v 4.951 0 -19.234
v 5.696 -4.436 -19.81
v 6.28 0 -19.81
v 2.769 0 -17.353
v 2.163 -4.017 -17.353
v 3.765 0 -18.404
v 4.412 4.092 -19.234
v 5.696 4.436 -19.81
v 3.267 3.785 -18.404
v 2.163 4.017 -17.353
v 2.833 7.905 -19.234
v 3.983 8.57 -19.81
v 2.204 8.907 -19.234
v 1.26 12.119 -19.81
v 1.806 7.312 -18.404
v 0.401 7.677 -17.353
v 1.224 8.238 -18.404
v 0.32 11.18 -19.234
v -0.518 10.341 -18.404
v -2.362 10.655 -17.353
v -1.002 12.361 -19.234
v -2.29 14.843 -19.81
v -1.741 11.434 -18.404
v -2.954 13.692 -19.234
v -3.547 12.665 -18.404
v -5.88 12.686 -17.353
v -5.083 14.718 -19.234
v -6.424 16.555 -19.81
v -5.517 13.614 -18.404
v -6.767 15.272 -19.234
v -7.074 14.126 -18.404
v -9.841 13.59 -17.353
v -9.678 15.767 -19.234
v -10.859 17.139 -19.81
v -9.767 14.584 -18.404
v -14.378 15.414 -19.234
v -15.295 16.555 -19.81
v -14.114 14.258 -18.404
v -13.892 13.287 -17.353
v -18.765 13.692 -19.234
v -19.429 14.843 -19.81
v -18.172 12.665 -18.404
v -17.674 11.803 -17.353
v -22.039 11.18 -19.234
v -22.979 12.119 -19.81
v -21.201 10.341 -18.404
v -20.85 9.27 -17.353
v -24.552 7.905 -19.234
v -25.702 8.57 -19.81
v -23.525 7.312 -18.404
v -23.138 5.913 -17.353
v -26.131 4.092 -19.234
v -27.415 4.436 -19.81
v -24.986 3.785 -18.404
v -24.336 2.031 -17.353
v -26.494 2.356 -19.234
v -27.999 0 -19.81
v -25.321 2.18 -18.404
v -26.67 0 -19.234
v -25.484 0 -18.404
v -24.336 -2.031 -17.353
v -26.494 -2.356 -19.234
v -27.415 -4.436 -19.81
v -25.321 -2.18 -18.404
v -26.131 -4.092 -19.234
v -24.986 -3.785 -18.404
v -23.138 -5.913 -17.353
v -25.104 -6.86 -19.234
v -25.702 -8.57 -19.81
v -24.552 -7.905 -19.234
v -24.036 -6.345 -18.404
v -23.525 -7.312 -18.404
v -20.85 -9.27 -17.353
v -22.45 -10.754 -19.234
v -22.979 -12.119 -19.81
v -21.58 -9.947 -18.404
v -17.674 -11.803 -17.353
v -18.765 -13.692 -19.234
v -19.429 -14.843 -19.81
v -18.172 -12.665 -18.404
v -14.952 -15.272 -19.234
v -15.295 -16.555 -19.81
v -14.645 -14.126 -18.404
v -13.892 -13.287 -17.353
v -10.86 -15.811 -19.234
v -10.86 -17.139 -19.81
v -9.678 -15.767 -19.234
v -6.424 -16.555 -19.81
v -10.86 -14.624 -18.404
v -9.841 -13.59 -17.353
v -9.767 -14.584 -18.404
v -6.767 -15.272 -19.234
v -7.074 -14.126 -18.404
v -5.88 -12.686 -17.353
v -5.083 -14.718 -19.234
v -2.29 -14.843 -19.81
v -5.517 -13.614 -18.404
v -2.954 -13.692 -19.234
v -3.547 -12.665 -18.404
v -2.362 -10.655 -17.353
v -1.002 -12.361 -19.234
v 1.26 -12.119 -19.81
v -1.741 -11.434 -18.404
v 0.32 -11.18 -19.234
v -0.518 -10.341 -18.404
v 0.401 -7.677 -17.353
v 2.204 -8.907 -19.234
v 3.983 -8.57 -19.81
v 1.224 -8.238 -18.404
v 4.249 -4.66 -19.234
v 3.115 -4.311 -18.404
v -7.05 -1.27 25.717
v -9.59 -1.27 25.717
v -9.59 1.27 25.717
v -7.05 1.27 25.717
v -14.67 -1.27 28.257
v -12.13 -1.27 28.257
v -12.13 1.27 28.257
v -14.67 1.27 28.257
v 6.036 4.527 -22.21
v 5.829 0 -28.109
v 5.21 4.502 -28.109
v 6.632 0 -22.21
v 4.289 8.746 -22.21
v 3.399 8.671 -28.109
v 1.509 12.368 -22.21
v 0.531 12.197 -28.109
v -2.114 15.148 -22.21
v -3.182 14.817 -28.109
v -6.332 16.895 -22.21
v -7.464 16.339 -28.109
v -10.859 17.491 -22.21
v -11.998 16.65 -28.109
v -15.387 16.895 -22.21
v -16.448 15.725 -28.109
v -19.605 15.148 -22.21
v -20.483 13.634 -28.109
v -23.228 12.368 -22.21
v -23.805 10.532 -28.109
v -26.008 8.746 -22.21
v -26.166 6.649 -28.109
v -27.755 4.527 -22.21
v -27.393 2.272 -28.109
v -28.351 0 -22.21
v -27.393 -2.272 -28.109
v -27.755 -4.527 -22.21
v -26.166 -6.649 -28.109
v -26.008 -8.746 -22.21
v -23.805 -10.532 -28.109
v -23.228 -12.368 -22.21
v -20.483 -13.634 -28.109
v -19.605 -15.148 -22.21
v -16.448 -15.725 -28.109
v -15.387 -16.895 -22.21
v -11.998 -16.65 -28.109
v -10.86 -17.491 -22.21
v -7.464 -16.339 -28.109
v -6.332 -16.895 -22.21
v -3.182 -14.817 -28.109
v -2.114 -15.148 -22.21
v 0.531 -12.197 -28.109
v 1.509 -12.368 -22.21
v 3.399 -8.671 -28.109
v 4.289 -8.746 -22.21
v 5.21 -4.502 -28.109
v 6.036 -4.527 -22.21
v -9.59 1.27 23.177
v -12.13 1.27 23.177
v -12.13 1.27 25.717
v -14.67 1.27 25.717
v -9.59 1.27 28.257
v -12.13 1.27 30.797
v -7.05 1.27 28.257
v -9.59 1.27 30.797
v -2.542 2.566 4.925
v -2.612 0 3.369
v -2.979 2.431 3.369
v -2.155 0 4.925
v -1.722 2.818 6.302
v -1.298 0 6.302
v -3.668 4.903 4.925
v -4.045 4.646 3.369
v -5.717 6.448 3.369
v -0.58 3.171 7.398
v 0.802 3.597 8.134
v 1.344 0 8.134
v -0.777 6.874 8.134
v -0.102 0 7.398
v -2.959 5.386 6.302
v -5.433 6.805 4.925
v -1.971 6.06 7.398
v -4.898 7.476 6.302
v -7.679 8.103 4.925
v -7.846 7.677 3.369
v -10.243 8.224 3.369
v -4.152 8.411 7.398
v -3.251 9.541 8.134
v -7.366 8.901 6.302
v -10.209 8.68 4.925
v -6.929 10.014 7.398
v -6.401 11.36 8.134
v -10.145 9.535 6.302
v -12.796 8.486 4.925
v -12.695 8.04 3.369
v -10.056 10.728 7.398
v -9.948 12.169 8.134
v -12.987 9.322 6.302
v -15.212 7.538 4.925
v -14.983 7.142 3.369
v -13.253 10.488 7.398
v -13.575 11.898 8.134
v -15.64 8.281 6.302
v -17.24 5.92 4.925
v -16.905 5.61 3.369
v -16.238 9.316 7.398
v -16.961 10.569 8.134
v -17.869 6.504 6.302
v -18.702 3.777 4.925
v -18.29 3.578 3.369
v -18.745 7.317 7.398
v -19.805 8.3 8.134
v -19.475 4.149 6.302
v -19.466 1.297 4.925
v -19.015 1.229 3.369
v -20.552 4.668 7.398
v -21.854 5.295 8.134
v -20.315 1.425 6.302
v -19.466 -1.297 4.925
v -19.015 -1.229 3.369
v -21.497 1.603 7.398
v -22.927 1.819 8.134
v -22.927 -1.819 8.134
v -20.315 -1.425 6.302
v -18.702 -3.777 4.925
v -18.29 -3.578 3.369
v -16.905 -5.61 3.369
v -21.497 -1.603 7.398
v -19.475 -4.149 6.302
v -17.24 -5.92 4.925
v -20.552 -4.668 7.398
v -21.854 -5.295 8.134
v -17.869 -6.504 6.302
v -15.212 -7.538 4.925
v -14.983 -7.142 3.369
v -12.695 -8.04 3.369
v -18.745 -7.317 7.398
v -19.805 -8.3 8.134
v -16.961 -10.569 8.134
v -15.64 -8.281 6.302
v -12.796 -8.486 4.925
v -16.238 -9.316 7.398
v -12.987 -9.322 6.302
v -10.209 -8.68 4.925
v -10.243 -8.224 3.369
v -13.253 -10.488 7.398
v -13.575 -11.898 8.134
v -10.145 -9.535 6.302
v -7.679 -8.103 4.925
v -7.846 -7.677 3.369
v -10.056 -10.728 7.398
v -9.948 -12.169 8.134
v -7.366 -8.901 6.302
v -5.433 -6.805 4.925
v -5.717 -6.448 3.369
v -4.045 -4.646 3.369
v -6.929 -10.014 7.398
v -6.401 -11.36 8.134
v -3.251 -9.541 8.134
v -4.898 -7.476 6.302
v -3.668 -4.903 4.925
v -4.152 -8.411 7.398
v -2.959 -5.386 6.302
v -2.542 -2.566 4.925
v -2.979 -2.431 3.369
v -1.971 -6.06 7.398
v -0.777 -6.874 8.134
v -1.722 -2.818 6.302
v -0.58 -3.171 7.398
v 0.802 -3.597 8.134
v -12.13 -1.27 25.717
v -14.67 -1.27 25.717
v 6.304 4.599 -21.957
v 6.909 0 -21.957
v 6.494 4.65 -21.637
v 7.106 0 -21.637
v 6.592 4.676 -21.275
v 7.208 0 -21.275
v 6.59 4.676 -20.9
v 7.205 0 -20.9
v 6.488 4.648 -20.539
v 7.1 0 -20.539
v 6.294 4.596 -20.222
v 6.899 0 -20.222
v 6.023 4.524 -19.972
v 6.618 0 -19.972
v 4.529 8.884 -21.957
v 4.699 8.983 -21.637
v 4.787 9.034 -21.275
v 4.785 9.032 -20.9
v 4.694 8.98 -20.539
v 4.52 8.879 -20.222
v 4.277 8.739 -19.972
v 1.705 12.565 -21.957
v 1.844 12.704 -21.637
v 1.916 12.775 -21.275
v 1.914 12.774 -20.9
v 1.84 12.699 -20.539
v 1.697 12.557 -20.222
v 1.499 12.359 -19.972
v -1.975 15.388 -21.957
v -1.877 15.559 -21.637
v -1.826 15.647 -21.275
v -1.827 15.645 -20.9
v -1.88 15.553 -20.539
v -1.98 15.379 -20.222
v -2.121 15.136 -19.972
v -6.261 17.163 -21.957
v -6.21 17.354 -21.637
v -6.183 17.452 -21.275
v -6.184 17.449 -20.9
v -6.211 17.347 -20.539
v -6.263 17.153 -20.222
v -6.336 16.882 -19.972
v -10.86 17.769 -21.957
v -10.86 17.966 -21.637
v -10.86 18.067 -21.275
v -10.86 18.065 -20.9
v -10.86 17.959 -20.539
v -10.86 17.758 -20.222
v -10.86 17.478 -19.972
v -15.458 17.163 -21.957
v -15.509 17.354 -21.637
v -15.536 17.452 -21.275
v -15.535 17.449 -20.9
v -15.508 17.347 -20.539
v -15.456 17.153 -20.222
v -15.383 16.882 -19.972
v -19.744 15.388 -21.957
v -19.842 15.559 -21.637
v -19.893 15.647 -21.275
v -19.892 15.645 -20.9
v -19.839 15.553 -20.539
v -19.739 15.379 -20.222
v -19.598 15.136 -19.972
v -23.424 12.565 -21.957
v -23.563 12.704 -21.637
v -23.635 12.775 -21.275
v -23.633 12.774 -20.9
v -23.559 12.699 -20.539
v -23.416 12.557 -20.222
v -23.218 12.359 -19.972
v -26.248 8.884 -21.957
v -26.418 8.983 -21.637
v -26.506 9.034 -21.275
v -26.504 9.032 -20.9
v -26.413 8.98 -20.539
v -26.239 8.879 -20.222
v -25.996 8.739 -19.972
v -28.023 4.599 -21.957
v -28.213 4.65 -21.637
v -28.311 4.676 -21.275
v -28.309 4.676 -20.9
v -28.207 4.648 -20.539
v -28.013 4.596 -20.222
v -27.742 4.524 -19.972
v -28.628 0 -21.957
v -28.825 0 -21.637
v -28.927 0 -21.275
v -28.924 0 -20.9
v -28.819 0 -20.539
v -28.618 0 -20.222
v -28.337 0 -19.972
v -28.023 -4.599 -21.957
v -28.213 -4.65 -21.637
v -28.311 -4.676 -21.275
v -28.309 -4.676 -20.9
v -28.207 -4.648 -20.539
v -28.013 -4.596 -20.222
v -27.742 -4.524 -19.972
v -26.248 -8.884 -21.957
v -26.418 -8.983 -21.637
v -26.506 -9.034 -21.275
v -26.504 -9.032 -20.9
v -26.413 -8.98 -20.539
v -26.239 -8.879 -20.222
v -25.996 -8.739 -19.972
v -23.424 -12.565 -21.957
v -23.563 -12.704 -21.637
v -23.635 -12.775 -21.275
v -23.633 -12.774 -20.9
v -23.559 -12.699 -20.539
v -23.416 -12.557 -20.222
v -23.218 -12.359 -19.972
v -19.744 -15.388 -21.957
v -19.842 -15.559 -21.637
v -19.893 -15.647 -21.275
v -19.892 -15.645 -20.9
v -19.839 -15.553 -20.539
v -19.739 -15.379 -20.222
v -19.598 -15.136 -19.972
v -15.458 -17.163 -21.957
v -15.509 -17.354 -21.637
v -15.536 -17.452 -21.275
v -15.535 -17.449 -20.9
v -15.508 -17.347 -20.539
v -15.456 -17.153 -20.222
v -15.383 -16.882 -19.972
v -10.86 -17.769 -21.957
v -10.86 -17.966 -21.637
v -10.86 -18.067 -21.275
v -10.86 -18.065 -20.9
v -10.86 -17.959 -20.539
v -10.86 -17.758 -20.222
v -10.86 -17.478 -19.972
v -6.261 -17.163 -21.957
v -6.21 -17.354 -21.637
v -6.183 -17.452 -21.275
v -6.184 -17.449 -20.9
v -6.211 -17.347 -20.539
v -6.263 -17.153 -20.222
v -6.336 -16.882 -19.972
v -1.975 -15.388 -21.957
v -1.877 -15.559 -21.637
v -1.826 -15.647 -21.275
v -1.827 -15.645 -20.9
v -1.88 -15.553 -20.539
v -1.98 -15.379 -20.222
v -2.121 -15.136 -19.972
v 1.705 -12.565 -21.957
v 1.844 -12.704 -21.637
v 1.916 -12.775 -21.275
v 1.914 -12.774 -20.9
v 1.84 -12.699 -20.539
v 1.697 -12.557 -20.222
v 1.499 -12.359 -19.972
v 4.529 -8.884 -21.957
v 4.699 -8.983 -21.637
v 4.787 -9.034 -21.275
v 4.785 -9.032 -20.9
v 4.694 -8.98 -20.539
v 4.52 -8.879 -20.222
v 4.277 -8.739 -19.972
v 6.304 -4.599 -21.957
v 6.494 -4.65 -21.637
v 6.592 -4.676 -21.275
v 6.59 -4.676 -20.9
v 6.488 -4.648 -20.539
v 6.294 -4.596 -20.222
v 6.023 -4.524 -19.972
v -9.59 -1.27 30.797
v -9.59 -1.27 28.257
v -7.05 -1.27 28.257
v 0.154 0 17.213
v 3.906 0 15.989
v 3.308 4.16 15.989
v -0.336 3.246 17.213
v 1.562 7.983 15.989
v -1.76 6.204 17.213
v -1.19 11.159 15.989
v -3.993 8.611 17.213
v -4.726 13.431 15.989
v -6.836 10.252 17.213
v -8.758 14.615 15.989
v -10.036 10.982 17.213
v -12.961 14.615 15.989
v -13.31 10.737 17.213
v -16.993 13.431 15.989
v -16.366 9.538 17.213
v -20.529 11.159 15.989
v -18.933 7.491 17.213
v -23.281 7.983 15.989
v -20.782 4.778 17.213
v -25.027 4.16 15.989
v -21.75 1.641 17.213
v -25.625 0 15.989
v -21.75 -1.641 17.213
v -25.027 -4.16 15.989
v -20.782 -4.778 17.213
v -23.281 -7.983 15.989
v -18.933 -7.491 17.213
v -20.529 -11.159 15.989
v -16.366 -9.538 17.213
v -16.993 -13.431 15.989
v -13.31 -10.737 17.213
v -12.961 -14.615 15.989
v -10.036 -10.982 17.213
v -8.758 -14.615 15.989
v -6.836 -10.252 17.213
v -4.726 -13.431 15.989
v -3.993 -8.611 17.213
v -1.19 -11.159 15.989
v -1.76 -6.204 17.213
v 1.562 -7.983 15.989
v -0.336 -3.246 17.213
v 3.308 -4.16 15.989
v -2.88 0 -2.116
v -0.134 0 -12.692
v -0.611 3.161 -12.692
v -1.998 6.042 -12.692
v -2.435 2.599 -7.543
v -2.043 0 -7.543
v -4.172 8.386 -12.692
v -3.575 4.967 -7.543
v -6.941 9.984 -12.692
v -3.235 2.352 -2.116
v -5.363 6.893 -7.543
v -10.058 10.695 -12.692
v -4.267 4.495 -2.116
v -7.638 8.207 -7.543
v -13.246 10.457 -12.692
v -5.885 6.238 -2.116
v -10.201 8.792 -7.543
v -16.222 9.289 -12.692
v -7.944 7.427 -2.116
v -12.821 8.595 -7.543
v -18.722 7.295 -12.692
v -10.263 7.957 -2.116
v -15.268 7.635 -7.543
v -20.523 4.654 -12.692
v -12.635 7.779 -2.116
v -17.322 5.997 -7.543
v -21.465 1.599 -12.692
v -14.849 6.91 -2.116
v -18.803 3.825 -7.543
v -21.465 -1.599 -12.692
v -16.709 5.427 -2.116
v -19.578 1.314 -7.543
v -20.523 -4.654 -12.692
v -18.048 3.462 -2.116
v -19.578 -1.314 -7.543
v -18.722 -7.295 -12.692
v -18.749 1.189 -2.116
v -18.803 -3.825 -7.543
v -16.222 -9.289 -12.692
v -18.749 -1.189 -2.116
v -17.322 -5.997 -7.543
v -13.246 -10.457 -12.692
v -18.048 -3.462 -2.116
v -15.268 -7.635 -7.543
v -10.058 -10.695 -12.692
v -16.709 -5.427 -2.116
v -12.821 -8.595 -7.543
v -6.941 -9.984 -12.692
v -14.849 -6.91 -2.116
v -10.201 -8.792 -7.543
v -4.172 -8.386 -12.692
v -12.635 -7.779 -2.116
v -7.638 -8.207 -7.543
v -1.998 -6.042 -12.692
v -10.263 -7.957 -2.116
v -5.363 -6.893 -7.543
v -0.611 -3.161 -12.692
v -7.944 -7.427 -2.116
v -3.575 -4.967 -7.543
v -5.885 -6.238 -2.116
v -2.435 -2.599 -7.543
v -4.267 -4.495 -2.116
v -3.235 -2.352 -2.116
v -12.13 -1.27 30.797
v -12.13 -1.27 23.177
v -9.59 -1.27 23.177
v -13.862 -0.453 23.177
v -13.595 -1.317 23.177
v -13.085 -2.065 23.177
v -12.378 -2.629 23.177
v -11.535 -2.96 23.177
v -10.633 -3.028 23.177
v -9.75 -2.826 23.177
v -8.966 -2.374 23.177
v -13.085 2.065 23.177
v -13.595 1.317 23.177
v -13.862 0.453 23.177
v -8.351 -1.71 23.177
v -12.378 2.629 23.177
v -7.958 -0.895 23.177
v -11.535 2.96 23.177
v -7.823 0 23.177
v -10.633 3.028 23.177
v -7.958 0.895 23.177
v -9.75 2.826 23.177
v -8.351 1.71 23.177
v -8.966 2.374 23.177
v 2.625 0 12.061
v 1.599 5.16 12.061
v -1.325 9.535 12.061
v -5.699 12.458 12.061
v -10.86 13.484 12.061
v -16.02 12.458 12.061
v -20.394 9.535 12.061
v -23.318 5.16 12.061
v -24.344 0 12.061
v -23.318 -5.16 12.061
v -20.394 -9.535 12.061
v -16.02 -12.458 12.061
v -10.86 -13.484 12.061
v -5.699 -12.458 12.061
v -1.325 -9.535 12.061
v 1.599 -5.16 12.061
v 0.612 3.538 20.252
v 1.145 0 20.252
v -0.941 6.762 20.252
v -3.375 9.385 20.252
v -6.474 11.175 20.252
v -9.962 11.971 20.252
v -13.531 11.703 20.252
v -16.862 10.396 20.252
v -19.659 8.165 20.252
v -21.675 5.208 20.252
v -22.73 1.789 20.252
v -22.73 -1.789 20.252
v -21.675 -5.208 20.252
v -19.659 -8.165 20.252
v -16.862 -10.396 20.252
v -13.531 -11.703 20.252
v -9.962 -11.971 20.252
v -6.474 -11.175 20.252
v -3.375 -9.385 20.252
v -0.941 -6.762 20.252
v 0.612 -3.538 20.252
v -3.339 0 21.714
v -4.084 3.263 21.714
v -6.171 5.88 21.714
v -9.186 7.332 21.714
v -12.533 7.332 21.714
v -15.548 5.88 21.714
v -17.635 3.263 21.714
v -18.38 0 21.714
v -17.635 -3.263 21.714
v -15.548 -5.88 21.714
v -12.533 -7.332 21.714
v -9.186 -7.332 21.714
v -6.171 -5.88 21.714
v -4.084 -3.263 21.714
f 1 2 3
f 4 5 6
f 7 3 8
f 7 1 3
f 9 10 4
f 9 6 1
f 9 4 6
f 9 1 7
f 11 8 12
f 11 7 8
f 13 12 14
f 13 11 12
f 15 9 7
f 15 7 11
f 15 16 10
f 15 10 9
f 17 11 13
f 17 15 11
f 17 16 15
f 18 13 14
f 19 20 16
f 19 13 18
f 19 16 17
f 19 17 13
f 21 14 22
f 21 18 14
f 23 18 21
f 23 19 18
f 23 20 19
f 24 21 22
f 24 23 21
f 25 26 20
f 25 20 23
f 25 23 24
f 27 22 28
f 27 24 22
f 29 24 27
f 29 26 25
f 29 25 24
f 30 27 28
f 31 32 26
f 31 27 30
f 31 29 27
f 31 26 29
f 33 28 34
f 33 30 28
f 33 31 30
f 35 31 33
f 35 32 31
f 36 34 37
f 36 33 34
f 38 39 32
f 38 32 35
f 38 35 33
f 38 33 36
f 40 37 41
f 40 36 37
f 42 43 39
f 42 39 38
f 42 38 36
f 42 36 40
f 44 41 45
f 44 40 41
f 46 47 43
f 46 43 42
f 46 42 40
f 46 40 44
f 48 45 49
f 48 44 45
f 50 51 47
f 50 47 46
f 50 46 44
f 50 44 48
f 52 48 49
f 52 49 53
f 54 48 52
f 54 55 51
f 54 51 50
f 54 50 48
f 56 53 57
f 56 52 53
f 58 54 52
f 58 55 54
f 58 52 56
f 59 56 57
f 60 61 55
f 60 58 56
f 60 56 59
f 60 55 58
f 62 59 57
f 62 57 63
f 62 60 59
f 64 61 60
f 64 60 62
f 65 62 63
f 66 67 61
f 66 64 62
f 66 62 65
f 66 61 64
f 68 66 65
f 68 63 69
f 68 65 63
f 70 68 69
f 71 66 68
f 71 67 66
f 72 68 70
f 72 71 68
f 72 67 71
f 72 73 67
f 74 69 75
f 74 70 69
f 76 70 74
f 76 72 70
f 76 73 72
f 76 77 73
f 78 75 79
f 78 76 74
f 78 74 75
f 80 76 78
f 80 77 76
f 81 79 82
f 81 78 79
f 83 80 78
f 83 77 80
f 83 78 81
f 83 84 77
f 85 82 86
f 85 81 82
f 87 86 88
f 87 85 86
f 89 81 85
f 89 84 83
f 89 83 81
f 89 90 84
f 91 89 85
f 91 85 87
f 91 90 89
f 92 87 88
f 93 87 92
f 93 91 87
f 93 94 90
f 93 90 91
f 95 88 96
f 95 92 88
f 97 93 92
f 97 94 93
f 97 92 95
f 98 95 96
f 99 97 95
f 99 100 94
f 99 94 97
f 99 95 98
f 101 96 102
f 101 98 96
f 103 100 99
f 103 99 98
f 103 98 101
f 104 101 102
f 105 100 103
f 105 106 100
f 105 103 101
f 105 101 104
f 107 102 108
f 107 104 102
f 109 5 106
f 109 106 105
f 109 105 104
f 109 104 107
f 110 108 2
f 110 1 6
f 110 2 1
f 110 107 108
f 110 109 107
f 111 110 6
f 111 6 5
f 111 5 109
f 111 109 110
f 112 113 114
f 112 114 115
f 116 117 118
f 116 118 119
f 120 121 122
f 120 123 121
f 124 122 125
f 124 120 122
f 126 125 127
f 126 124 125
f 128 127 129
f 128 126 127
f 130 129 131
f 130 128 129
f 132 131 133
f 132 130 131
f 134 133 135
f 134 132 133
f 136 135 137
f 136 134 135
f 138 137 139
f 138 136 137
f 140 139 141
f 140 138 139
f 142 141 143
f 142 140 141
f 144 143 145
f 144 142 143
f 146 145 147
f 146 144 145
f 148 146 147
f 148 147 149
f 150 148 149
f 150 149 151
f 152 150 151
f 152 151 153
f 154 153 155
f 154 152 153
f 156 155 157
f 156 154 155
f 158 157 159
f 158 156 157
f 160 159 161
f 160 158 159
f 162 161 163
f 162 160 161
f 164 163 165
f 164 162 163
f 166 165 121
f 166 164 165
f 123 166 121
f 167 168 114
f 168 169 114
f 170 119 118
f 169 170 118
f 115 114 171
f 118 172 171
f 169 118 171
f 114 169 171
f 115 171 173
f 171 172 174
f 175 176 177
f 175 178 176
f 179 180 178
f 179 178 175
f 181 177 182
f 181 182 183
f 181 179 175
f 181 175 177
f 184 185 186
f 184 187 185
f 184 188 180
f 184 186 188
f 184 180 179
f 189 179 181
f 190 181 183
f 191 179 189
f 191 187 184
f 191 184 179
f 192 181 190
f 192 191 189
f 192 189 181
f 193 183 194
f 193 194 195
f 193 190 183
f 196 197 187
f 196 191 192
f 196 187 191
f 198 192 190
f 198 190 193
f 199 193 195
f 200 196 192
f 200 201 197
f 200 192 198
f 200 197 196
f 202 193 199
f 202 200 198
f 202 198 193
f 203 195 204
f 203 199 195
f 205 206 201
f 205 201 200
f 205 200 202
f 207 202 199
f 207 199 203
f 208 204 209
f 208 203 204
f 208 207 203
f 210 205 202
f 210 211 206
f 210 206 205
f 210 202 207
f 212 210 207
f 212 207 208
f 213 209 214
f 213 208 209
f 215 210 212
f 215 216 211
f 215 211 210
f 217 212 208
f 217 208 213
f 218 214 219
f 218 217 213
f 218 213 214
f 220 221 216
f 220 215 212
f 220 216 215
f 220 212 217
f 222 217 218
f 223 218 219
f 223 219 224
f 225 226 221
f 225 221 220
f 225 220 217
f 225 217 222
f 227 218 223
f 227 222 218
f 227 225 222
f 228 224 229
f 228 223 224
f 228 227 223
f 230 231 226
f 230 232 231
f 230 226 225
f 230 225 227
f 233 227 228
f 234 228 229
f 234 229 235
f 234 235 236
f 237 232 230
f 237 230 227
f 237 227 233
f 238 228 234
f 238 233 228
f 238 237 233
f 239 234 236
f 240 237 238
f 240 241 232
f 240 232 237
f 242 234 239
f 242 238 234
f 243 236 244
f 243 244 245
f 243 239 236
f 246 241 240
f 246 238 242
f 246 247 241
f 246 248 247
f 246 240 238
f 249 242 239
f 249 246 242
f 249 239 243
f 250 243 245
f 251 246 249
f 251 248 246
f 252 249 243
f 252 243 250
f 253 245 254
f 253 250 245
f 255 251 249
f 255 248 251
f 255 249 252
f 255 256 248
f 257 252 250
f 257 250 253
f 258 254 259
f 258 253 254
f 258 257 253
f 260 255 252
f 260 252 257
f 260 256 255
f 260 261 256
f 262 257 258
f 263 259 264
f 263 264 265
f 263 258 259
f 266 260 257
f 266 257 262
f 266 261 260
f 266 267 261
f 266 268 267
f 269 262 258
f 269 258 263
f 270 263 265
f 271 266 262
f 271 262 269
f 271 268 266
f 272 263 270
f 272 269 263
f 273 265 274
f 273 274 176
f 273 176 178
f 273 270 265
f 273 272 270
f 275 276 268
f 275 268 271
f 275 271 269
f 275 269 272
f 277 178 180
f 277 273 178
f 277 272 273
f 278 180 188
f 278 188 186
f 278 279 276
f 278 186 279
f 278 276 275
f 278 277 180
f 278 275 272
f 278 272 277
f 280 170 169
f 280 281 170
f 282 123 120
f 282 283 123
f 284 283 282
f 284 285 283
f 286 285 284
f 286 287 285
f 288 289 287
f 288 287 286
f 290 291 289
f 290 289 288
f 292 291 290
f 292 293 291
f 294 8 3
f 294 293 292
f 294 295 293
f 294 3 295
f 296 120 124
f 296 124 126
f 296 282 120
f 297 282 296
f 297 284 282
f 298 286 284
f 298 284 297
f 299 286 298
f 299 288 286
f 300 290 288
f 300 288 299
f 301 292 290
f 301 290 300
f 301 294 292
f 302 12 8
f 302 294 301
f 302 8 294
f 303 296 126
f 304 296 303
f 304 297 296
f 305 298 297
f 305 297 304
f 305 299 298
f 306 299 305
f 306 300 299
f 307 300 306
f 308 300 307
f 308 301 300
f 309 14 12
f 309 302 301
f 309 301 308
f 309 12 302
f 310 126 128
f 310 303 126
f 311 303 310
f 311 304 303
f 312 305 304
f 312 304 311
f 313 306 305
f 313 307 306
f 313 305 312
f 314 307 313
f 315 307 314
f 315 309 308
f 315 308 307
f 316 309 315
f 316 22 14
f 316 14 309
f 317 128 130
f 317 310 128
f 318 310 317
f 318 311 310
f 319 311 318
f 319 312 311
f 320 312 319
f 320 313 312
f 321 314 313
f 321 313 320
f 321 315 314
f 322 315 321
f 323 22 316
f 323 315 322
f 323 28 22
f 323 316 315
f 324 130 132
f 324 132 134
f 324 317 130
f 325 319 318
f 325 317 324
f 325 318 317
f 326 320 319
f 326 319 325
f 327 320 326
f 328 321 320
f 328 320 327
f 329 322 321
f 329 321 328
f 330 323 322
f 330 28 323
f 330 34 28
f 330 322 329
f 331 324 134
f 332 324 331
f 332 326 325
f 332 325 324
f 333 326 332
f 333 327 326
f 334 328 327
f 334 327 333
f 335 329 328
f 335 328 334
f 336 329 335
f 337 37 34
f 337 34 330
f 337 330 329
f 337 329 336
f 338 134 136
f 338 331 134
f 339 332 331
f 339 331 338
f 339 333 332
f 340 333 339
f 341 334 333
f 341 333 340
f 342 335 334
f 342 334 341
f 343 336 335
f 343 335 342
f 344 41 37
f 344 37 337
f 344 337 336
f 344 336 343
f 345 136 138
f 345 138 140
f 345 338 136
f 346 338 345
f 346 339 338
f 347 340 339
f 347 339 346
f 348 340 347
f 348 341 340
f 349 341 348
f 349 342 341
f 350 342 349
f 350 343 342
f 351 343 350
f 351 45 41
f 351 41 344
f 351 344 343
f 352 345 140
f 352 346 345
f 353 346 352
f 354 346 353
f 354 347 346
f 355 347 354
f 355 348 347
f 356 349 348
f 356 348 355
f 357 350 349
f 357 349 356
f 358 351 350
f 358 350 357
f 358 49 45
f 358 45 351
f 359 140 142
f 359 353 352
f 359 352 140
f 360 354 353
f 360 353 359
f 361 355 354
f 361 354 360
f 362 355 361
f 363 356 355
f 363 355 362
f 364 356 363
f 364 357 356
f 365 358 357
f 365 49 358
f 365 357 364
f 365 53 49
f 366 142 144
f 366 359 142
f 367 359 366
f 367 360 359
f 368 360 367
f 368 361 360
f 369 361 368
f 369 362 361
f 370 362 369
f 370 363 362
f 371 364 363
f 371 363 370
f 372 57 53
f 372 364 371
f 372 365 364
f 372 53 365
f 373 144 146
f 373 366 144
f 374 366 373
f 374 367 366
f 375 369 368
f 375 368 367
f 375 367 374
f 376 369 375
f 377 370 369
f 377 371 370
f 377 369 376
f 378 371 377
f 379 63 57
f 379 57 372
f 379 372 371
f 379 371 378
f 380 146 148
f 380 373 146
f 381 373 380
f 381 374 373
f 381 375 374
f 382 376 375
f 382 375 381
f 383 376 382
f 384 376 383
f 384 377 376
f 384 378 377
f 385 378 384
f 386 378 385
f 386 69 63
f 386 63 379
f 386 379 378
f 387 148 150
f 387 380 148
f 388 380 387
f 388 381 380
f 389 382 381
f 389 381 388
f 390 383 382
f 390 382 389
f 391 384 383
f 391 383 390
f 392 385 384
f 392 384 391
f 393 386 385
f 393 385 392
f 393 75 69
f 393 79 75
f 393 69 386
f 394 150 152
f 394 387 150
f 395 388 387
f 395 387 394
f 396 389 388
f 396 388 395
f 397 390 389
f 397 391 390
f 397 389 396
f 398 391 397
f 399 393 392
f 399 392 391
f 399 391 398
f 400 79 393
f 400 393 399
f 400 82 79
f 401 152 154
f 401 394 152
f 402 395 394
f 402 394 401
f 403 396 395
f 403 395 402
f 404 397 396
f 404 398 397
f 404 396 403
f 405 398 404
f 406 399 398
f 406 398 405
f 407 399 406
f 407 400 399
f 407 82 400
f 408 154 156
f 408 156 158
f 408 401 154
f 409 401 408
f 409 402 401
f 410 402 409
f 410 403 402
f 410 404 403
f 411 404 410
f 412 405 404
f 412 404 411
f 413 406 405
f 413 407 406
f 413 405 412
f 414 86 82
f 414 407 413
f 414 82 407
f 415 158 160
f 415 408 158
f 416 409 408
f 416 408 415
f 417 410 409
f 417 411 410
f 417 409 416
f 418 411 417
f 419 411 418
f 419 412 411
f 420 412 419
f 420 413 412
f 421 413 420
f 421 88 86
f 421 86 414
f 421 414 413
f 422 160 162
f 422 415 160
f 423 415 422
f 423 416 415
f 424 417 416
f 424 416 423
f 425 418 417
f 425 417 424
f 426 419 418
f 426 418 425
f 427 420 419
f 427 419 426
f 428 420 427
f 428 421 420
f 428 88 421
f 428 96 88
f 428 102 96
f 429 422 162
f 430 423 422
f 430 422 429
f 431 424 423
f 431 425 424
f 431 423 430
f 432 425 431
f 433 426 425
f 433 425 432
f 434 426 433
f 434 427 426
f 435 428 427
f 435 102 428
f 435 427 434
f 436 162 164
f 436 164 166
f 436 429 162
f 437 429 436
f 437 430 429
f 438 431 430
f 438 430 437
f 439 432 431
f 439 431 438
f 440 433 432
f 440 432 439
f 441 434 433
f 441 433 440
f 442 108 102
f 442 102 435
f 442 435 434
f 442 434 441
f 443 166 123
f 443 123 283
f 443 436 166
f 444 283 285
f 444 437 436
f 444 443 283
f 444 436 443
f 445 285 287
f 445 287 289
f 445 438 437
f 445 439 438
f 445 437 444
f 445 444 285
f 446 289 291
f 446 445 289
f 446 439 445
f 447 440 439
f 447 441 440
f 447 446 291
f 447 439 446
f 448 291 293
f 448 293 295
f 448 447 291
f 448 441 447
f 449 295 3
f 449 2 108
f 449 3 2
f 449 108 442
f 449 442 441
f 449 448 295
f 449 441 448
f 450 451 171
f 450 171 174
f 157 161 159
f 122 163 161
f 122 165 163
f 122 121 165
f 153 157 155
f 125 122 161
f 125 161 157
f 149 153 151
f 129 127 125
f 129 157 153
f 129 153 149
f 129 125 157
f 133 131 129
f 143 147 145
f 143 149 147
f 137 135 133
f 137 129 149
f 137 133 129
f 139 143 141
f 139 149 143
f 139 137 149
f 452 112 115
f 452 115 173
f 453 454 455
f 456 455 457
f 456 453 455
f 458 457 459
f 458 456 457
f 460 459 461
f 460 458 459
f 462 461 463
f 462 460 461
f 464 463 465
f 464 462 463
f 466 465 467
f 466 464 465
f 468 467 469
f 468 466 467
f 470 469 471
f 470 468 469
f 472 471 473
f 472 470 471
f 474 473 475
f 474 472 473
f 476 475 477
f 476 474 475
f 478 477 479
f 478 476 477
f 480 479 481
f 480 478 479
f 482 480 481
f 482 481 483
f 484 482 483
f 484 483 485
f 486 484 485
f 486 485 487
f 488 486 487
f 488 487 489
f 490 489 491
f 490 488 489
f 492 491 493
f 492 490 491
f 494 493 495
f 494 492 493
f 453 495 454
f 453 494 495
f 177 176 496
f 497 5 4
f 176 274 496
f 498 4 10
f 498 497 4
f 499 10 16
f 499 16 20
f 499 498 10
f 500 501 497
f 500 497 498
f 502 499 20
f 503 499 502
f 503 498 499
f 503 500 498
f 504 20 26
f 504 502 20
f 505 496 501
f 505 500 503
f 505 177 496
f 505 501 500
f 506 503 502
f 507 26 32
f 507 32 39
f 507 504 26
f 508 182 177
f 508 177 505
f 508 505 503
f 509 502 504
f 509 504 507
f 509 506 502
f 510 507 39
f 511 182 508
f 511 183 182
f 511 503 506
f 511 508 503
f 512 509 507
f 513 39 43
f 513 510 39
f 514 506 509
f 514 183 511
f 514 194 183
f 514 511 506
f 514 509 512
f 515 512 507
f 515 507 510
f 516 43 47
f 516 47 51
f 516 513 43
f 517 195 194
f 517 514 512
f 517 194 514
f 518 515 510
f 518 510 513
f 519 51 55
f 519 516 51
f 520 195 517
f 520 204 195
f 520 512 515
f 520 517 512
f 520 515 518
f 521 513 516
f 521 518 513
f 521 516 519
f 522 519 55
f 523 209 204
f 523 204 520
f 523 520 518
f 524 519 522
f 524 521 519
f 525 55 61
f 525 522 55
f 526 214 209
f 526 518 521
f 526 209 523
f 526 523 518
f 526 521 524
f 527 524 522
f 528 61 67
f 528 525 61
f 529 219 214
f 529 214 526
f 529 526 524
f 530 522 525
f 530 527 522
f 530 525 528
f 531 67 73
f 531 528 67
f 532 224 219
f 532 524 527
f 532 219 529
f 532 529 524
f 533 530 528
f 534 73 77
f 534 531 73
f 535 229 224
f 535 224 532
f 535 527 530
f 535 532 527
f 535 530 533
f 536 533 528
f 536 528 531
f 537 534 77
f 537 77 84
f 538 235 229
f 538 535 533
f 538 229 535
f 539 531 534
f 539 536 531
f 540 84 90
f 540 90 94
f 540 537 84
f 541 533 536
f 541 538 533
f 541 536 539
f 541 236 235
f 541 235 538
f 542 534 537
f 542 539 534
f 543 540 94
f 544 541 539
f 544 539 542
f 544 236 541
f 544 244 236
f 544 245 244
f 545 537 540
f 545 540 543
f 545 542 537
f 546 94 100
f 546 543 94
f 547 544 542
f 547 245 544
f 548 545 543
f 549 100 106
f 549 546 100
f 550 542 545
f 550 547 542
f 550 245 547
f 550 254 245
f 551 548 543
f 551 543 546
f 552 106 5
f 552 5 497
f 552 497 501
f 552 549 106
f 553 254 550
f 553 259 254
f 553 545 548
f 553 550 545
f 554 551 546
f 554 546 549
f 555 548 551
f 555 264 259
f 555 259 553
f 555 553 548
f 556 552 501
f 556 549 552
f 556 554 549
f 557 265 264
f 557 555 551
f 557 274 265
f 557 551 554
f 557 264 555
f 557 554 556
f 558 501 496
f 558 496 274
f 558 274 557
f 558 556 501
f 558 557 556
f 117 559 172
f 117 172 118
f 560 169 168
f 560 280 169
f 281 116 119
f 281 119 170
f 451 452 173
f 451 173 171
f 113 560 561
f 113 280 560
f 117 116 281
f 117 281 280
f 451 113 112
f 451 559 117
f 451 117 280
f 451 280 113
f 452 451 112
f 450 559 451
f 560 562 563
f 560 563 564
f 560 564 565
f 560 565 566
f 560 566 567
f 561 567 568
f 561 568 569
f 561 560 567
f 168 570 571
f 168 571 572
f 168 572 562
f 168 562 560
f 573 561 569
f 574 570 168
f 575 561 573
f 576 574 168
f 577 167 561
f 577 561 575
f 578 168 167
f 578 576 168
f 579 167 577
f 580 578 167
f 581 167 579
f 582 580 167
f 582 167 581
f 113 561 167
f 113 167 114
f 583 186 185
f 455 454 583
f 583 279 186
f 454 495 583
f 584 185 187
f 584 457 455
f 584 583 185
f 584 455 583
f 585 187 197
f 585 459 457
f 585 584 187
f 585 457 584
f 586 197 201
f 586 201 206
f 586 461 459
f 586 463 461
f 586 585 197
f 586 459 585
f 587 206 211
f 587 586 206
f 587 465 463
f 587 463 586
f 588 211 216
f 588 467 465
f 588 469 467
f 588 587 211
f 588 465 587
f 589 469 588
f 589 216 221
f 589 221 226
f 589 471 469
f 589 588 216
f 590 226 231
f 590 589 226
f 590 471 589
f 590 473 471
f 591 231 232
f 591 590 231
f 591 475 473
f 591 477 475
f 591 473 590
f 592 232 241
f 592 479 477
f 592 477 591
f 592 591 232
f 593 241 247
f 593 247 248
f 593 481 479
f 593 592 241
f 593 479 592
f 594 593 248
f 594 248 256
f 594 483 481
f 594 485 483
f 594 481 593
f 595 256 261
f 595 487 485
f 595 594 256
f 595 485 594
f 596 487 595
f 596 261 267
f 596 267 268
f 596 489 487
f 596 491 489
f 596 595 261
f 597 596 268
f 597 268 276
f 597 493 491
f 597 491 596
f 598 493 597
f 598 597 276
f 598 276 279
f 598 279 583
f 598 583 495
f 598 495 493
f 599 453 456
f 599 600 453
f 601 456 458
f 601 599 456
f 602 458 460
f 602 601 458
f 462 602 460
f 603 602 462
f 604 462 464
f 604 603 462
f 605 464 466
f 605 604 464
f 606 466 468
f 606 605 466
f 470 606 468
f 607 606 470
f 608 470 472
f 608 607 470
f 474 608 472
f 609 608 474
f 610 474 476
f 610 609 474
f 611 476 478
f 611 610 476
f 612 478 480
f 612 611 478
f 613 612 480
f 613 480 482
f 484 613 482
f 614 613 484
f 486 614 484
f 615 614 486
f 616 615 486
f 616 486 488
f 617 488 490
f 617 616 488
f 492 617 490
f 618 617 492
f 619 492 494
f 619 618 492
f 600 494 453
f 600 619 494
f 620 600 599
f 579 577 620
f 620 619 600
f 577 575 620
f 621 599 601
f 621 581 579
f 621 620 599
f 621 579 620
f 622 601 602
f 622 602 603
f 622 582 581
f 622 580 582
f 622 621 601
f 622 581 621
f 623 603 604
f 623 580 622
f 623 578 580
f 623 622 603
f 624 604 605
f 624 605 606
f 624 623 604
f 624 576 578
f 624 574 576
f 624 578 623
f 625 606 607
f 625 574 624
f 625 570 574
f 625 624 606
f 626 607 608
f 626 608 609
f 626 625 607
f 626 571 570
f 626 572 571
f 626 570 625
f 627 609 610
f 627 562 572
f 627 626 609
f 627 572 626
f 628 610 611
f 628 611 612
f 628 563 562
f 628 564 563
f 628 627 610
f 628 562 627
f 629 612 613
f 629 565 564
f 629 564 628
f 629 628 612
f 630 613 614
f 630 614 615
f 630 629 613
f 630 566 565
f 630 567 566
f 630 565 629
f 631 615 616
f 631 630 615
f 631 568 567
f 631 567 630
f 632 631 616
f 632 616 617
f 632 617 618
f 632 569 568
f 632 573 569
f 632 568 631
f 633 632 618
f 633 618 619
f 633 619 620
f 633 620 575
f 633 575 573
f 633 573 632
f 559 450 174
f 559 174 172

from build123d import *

# Parameters (mm, degrees)
F2_DEPTH = 1.27


with BuildPart() as f1:
    # F0 (on Front) → F1 (revolve)
    with BuildSketch(Plane.XZ):
        with BuildLine():
            Line((-10.8595, 23.176616), (-10.8595, -28.108846))
            Line((-10.8595, -28.108846), (5.828938, -28.108846))
            Line((5.828938, -28.108846), (6.631959, -22.209617))
            ThreePointArc((6.631959, -22.209617), (7.2054, -20.8997), (6.279642, -19.809889))
            ThreePointArc((6.279642, -19.809889), (4.337177, -18.849044), (2.768878, -17.35344))
            ThreePointArc((2.768878, -17.35344), (-2.043012, -7.543205), (-2.61231, 3.368755))
            ThreePointArc((-2.61231, 3.368755), (-1.297535, 6.30196), (1.343976, 8.133555))
            Line((1.343976, 8.133555), (3.905977, 15.989157))
            Line((3.905977, 15.989157), (0.153749, 17.212897))
            Line((0.153749, 17.212897), (1.144844, 20.251788))
            Line((1.144844, 20.251788), (-7.823259, 23.176616))
            Line((-7.823259, 23.176616), (-9.5895, 23.176616))
            Line((-9.5895, 23.176616), (-10.8595, 23.176616))
        make_face()
    revolve(axis=Axis((-10.8595, 0, -2.466115), (0, 0, 1)))

    # F0 (on Front) → F2 (join, symmetric)
    with BuildSketch(Plane.XZ):
        Polygon((-12.1295, 23.176616), (-10.8595, 23.176616), (-9.5895, 23.176616), (-9.5895, 25.716616), (-7.0495, 25.716616), (-7.0495, 28.256616), (-9.5895, 28.256616), (-9.5895, 30.796616), (-10.8595, 30.796616), (-12.1295, 30.796616), (-12.1295, 28.256616), (-14.6695, 28.256616), (-14.6695, 25.716616), (-12.1295, 25.716616), align=None)
    extrude(amount=F2_DEPTH, both=True)


solid = f1.part
